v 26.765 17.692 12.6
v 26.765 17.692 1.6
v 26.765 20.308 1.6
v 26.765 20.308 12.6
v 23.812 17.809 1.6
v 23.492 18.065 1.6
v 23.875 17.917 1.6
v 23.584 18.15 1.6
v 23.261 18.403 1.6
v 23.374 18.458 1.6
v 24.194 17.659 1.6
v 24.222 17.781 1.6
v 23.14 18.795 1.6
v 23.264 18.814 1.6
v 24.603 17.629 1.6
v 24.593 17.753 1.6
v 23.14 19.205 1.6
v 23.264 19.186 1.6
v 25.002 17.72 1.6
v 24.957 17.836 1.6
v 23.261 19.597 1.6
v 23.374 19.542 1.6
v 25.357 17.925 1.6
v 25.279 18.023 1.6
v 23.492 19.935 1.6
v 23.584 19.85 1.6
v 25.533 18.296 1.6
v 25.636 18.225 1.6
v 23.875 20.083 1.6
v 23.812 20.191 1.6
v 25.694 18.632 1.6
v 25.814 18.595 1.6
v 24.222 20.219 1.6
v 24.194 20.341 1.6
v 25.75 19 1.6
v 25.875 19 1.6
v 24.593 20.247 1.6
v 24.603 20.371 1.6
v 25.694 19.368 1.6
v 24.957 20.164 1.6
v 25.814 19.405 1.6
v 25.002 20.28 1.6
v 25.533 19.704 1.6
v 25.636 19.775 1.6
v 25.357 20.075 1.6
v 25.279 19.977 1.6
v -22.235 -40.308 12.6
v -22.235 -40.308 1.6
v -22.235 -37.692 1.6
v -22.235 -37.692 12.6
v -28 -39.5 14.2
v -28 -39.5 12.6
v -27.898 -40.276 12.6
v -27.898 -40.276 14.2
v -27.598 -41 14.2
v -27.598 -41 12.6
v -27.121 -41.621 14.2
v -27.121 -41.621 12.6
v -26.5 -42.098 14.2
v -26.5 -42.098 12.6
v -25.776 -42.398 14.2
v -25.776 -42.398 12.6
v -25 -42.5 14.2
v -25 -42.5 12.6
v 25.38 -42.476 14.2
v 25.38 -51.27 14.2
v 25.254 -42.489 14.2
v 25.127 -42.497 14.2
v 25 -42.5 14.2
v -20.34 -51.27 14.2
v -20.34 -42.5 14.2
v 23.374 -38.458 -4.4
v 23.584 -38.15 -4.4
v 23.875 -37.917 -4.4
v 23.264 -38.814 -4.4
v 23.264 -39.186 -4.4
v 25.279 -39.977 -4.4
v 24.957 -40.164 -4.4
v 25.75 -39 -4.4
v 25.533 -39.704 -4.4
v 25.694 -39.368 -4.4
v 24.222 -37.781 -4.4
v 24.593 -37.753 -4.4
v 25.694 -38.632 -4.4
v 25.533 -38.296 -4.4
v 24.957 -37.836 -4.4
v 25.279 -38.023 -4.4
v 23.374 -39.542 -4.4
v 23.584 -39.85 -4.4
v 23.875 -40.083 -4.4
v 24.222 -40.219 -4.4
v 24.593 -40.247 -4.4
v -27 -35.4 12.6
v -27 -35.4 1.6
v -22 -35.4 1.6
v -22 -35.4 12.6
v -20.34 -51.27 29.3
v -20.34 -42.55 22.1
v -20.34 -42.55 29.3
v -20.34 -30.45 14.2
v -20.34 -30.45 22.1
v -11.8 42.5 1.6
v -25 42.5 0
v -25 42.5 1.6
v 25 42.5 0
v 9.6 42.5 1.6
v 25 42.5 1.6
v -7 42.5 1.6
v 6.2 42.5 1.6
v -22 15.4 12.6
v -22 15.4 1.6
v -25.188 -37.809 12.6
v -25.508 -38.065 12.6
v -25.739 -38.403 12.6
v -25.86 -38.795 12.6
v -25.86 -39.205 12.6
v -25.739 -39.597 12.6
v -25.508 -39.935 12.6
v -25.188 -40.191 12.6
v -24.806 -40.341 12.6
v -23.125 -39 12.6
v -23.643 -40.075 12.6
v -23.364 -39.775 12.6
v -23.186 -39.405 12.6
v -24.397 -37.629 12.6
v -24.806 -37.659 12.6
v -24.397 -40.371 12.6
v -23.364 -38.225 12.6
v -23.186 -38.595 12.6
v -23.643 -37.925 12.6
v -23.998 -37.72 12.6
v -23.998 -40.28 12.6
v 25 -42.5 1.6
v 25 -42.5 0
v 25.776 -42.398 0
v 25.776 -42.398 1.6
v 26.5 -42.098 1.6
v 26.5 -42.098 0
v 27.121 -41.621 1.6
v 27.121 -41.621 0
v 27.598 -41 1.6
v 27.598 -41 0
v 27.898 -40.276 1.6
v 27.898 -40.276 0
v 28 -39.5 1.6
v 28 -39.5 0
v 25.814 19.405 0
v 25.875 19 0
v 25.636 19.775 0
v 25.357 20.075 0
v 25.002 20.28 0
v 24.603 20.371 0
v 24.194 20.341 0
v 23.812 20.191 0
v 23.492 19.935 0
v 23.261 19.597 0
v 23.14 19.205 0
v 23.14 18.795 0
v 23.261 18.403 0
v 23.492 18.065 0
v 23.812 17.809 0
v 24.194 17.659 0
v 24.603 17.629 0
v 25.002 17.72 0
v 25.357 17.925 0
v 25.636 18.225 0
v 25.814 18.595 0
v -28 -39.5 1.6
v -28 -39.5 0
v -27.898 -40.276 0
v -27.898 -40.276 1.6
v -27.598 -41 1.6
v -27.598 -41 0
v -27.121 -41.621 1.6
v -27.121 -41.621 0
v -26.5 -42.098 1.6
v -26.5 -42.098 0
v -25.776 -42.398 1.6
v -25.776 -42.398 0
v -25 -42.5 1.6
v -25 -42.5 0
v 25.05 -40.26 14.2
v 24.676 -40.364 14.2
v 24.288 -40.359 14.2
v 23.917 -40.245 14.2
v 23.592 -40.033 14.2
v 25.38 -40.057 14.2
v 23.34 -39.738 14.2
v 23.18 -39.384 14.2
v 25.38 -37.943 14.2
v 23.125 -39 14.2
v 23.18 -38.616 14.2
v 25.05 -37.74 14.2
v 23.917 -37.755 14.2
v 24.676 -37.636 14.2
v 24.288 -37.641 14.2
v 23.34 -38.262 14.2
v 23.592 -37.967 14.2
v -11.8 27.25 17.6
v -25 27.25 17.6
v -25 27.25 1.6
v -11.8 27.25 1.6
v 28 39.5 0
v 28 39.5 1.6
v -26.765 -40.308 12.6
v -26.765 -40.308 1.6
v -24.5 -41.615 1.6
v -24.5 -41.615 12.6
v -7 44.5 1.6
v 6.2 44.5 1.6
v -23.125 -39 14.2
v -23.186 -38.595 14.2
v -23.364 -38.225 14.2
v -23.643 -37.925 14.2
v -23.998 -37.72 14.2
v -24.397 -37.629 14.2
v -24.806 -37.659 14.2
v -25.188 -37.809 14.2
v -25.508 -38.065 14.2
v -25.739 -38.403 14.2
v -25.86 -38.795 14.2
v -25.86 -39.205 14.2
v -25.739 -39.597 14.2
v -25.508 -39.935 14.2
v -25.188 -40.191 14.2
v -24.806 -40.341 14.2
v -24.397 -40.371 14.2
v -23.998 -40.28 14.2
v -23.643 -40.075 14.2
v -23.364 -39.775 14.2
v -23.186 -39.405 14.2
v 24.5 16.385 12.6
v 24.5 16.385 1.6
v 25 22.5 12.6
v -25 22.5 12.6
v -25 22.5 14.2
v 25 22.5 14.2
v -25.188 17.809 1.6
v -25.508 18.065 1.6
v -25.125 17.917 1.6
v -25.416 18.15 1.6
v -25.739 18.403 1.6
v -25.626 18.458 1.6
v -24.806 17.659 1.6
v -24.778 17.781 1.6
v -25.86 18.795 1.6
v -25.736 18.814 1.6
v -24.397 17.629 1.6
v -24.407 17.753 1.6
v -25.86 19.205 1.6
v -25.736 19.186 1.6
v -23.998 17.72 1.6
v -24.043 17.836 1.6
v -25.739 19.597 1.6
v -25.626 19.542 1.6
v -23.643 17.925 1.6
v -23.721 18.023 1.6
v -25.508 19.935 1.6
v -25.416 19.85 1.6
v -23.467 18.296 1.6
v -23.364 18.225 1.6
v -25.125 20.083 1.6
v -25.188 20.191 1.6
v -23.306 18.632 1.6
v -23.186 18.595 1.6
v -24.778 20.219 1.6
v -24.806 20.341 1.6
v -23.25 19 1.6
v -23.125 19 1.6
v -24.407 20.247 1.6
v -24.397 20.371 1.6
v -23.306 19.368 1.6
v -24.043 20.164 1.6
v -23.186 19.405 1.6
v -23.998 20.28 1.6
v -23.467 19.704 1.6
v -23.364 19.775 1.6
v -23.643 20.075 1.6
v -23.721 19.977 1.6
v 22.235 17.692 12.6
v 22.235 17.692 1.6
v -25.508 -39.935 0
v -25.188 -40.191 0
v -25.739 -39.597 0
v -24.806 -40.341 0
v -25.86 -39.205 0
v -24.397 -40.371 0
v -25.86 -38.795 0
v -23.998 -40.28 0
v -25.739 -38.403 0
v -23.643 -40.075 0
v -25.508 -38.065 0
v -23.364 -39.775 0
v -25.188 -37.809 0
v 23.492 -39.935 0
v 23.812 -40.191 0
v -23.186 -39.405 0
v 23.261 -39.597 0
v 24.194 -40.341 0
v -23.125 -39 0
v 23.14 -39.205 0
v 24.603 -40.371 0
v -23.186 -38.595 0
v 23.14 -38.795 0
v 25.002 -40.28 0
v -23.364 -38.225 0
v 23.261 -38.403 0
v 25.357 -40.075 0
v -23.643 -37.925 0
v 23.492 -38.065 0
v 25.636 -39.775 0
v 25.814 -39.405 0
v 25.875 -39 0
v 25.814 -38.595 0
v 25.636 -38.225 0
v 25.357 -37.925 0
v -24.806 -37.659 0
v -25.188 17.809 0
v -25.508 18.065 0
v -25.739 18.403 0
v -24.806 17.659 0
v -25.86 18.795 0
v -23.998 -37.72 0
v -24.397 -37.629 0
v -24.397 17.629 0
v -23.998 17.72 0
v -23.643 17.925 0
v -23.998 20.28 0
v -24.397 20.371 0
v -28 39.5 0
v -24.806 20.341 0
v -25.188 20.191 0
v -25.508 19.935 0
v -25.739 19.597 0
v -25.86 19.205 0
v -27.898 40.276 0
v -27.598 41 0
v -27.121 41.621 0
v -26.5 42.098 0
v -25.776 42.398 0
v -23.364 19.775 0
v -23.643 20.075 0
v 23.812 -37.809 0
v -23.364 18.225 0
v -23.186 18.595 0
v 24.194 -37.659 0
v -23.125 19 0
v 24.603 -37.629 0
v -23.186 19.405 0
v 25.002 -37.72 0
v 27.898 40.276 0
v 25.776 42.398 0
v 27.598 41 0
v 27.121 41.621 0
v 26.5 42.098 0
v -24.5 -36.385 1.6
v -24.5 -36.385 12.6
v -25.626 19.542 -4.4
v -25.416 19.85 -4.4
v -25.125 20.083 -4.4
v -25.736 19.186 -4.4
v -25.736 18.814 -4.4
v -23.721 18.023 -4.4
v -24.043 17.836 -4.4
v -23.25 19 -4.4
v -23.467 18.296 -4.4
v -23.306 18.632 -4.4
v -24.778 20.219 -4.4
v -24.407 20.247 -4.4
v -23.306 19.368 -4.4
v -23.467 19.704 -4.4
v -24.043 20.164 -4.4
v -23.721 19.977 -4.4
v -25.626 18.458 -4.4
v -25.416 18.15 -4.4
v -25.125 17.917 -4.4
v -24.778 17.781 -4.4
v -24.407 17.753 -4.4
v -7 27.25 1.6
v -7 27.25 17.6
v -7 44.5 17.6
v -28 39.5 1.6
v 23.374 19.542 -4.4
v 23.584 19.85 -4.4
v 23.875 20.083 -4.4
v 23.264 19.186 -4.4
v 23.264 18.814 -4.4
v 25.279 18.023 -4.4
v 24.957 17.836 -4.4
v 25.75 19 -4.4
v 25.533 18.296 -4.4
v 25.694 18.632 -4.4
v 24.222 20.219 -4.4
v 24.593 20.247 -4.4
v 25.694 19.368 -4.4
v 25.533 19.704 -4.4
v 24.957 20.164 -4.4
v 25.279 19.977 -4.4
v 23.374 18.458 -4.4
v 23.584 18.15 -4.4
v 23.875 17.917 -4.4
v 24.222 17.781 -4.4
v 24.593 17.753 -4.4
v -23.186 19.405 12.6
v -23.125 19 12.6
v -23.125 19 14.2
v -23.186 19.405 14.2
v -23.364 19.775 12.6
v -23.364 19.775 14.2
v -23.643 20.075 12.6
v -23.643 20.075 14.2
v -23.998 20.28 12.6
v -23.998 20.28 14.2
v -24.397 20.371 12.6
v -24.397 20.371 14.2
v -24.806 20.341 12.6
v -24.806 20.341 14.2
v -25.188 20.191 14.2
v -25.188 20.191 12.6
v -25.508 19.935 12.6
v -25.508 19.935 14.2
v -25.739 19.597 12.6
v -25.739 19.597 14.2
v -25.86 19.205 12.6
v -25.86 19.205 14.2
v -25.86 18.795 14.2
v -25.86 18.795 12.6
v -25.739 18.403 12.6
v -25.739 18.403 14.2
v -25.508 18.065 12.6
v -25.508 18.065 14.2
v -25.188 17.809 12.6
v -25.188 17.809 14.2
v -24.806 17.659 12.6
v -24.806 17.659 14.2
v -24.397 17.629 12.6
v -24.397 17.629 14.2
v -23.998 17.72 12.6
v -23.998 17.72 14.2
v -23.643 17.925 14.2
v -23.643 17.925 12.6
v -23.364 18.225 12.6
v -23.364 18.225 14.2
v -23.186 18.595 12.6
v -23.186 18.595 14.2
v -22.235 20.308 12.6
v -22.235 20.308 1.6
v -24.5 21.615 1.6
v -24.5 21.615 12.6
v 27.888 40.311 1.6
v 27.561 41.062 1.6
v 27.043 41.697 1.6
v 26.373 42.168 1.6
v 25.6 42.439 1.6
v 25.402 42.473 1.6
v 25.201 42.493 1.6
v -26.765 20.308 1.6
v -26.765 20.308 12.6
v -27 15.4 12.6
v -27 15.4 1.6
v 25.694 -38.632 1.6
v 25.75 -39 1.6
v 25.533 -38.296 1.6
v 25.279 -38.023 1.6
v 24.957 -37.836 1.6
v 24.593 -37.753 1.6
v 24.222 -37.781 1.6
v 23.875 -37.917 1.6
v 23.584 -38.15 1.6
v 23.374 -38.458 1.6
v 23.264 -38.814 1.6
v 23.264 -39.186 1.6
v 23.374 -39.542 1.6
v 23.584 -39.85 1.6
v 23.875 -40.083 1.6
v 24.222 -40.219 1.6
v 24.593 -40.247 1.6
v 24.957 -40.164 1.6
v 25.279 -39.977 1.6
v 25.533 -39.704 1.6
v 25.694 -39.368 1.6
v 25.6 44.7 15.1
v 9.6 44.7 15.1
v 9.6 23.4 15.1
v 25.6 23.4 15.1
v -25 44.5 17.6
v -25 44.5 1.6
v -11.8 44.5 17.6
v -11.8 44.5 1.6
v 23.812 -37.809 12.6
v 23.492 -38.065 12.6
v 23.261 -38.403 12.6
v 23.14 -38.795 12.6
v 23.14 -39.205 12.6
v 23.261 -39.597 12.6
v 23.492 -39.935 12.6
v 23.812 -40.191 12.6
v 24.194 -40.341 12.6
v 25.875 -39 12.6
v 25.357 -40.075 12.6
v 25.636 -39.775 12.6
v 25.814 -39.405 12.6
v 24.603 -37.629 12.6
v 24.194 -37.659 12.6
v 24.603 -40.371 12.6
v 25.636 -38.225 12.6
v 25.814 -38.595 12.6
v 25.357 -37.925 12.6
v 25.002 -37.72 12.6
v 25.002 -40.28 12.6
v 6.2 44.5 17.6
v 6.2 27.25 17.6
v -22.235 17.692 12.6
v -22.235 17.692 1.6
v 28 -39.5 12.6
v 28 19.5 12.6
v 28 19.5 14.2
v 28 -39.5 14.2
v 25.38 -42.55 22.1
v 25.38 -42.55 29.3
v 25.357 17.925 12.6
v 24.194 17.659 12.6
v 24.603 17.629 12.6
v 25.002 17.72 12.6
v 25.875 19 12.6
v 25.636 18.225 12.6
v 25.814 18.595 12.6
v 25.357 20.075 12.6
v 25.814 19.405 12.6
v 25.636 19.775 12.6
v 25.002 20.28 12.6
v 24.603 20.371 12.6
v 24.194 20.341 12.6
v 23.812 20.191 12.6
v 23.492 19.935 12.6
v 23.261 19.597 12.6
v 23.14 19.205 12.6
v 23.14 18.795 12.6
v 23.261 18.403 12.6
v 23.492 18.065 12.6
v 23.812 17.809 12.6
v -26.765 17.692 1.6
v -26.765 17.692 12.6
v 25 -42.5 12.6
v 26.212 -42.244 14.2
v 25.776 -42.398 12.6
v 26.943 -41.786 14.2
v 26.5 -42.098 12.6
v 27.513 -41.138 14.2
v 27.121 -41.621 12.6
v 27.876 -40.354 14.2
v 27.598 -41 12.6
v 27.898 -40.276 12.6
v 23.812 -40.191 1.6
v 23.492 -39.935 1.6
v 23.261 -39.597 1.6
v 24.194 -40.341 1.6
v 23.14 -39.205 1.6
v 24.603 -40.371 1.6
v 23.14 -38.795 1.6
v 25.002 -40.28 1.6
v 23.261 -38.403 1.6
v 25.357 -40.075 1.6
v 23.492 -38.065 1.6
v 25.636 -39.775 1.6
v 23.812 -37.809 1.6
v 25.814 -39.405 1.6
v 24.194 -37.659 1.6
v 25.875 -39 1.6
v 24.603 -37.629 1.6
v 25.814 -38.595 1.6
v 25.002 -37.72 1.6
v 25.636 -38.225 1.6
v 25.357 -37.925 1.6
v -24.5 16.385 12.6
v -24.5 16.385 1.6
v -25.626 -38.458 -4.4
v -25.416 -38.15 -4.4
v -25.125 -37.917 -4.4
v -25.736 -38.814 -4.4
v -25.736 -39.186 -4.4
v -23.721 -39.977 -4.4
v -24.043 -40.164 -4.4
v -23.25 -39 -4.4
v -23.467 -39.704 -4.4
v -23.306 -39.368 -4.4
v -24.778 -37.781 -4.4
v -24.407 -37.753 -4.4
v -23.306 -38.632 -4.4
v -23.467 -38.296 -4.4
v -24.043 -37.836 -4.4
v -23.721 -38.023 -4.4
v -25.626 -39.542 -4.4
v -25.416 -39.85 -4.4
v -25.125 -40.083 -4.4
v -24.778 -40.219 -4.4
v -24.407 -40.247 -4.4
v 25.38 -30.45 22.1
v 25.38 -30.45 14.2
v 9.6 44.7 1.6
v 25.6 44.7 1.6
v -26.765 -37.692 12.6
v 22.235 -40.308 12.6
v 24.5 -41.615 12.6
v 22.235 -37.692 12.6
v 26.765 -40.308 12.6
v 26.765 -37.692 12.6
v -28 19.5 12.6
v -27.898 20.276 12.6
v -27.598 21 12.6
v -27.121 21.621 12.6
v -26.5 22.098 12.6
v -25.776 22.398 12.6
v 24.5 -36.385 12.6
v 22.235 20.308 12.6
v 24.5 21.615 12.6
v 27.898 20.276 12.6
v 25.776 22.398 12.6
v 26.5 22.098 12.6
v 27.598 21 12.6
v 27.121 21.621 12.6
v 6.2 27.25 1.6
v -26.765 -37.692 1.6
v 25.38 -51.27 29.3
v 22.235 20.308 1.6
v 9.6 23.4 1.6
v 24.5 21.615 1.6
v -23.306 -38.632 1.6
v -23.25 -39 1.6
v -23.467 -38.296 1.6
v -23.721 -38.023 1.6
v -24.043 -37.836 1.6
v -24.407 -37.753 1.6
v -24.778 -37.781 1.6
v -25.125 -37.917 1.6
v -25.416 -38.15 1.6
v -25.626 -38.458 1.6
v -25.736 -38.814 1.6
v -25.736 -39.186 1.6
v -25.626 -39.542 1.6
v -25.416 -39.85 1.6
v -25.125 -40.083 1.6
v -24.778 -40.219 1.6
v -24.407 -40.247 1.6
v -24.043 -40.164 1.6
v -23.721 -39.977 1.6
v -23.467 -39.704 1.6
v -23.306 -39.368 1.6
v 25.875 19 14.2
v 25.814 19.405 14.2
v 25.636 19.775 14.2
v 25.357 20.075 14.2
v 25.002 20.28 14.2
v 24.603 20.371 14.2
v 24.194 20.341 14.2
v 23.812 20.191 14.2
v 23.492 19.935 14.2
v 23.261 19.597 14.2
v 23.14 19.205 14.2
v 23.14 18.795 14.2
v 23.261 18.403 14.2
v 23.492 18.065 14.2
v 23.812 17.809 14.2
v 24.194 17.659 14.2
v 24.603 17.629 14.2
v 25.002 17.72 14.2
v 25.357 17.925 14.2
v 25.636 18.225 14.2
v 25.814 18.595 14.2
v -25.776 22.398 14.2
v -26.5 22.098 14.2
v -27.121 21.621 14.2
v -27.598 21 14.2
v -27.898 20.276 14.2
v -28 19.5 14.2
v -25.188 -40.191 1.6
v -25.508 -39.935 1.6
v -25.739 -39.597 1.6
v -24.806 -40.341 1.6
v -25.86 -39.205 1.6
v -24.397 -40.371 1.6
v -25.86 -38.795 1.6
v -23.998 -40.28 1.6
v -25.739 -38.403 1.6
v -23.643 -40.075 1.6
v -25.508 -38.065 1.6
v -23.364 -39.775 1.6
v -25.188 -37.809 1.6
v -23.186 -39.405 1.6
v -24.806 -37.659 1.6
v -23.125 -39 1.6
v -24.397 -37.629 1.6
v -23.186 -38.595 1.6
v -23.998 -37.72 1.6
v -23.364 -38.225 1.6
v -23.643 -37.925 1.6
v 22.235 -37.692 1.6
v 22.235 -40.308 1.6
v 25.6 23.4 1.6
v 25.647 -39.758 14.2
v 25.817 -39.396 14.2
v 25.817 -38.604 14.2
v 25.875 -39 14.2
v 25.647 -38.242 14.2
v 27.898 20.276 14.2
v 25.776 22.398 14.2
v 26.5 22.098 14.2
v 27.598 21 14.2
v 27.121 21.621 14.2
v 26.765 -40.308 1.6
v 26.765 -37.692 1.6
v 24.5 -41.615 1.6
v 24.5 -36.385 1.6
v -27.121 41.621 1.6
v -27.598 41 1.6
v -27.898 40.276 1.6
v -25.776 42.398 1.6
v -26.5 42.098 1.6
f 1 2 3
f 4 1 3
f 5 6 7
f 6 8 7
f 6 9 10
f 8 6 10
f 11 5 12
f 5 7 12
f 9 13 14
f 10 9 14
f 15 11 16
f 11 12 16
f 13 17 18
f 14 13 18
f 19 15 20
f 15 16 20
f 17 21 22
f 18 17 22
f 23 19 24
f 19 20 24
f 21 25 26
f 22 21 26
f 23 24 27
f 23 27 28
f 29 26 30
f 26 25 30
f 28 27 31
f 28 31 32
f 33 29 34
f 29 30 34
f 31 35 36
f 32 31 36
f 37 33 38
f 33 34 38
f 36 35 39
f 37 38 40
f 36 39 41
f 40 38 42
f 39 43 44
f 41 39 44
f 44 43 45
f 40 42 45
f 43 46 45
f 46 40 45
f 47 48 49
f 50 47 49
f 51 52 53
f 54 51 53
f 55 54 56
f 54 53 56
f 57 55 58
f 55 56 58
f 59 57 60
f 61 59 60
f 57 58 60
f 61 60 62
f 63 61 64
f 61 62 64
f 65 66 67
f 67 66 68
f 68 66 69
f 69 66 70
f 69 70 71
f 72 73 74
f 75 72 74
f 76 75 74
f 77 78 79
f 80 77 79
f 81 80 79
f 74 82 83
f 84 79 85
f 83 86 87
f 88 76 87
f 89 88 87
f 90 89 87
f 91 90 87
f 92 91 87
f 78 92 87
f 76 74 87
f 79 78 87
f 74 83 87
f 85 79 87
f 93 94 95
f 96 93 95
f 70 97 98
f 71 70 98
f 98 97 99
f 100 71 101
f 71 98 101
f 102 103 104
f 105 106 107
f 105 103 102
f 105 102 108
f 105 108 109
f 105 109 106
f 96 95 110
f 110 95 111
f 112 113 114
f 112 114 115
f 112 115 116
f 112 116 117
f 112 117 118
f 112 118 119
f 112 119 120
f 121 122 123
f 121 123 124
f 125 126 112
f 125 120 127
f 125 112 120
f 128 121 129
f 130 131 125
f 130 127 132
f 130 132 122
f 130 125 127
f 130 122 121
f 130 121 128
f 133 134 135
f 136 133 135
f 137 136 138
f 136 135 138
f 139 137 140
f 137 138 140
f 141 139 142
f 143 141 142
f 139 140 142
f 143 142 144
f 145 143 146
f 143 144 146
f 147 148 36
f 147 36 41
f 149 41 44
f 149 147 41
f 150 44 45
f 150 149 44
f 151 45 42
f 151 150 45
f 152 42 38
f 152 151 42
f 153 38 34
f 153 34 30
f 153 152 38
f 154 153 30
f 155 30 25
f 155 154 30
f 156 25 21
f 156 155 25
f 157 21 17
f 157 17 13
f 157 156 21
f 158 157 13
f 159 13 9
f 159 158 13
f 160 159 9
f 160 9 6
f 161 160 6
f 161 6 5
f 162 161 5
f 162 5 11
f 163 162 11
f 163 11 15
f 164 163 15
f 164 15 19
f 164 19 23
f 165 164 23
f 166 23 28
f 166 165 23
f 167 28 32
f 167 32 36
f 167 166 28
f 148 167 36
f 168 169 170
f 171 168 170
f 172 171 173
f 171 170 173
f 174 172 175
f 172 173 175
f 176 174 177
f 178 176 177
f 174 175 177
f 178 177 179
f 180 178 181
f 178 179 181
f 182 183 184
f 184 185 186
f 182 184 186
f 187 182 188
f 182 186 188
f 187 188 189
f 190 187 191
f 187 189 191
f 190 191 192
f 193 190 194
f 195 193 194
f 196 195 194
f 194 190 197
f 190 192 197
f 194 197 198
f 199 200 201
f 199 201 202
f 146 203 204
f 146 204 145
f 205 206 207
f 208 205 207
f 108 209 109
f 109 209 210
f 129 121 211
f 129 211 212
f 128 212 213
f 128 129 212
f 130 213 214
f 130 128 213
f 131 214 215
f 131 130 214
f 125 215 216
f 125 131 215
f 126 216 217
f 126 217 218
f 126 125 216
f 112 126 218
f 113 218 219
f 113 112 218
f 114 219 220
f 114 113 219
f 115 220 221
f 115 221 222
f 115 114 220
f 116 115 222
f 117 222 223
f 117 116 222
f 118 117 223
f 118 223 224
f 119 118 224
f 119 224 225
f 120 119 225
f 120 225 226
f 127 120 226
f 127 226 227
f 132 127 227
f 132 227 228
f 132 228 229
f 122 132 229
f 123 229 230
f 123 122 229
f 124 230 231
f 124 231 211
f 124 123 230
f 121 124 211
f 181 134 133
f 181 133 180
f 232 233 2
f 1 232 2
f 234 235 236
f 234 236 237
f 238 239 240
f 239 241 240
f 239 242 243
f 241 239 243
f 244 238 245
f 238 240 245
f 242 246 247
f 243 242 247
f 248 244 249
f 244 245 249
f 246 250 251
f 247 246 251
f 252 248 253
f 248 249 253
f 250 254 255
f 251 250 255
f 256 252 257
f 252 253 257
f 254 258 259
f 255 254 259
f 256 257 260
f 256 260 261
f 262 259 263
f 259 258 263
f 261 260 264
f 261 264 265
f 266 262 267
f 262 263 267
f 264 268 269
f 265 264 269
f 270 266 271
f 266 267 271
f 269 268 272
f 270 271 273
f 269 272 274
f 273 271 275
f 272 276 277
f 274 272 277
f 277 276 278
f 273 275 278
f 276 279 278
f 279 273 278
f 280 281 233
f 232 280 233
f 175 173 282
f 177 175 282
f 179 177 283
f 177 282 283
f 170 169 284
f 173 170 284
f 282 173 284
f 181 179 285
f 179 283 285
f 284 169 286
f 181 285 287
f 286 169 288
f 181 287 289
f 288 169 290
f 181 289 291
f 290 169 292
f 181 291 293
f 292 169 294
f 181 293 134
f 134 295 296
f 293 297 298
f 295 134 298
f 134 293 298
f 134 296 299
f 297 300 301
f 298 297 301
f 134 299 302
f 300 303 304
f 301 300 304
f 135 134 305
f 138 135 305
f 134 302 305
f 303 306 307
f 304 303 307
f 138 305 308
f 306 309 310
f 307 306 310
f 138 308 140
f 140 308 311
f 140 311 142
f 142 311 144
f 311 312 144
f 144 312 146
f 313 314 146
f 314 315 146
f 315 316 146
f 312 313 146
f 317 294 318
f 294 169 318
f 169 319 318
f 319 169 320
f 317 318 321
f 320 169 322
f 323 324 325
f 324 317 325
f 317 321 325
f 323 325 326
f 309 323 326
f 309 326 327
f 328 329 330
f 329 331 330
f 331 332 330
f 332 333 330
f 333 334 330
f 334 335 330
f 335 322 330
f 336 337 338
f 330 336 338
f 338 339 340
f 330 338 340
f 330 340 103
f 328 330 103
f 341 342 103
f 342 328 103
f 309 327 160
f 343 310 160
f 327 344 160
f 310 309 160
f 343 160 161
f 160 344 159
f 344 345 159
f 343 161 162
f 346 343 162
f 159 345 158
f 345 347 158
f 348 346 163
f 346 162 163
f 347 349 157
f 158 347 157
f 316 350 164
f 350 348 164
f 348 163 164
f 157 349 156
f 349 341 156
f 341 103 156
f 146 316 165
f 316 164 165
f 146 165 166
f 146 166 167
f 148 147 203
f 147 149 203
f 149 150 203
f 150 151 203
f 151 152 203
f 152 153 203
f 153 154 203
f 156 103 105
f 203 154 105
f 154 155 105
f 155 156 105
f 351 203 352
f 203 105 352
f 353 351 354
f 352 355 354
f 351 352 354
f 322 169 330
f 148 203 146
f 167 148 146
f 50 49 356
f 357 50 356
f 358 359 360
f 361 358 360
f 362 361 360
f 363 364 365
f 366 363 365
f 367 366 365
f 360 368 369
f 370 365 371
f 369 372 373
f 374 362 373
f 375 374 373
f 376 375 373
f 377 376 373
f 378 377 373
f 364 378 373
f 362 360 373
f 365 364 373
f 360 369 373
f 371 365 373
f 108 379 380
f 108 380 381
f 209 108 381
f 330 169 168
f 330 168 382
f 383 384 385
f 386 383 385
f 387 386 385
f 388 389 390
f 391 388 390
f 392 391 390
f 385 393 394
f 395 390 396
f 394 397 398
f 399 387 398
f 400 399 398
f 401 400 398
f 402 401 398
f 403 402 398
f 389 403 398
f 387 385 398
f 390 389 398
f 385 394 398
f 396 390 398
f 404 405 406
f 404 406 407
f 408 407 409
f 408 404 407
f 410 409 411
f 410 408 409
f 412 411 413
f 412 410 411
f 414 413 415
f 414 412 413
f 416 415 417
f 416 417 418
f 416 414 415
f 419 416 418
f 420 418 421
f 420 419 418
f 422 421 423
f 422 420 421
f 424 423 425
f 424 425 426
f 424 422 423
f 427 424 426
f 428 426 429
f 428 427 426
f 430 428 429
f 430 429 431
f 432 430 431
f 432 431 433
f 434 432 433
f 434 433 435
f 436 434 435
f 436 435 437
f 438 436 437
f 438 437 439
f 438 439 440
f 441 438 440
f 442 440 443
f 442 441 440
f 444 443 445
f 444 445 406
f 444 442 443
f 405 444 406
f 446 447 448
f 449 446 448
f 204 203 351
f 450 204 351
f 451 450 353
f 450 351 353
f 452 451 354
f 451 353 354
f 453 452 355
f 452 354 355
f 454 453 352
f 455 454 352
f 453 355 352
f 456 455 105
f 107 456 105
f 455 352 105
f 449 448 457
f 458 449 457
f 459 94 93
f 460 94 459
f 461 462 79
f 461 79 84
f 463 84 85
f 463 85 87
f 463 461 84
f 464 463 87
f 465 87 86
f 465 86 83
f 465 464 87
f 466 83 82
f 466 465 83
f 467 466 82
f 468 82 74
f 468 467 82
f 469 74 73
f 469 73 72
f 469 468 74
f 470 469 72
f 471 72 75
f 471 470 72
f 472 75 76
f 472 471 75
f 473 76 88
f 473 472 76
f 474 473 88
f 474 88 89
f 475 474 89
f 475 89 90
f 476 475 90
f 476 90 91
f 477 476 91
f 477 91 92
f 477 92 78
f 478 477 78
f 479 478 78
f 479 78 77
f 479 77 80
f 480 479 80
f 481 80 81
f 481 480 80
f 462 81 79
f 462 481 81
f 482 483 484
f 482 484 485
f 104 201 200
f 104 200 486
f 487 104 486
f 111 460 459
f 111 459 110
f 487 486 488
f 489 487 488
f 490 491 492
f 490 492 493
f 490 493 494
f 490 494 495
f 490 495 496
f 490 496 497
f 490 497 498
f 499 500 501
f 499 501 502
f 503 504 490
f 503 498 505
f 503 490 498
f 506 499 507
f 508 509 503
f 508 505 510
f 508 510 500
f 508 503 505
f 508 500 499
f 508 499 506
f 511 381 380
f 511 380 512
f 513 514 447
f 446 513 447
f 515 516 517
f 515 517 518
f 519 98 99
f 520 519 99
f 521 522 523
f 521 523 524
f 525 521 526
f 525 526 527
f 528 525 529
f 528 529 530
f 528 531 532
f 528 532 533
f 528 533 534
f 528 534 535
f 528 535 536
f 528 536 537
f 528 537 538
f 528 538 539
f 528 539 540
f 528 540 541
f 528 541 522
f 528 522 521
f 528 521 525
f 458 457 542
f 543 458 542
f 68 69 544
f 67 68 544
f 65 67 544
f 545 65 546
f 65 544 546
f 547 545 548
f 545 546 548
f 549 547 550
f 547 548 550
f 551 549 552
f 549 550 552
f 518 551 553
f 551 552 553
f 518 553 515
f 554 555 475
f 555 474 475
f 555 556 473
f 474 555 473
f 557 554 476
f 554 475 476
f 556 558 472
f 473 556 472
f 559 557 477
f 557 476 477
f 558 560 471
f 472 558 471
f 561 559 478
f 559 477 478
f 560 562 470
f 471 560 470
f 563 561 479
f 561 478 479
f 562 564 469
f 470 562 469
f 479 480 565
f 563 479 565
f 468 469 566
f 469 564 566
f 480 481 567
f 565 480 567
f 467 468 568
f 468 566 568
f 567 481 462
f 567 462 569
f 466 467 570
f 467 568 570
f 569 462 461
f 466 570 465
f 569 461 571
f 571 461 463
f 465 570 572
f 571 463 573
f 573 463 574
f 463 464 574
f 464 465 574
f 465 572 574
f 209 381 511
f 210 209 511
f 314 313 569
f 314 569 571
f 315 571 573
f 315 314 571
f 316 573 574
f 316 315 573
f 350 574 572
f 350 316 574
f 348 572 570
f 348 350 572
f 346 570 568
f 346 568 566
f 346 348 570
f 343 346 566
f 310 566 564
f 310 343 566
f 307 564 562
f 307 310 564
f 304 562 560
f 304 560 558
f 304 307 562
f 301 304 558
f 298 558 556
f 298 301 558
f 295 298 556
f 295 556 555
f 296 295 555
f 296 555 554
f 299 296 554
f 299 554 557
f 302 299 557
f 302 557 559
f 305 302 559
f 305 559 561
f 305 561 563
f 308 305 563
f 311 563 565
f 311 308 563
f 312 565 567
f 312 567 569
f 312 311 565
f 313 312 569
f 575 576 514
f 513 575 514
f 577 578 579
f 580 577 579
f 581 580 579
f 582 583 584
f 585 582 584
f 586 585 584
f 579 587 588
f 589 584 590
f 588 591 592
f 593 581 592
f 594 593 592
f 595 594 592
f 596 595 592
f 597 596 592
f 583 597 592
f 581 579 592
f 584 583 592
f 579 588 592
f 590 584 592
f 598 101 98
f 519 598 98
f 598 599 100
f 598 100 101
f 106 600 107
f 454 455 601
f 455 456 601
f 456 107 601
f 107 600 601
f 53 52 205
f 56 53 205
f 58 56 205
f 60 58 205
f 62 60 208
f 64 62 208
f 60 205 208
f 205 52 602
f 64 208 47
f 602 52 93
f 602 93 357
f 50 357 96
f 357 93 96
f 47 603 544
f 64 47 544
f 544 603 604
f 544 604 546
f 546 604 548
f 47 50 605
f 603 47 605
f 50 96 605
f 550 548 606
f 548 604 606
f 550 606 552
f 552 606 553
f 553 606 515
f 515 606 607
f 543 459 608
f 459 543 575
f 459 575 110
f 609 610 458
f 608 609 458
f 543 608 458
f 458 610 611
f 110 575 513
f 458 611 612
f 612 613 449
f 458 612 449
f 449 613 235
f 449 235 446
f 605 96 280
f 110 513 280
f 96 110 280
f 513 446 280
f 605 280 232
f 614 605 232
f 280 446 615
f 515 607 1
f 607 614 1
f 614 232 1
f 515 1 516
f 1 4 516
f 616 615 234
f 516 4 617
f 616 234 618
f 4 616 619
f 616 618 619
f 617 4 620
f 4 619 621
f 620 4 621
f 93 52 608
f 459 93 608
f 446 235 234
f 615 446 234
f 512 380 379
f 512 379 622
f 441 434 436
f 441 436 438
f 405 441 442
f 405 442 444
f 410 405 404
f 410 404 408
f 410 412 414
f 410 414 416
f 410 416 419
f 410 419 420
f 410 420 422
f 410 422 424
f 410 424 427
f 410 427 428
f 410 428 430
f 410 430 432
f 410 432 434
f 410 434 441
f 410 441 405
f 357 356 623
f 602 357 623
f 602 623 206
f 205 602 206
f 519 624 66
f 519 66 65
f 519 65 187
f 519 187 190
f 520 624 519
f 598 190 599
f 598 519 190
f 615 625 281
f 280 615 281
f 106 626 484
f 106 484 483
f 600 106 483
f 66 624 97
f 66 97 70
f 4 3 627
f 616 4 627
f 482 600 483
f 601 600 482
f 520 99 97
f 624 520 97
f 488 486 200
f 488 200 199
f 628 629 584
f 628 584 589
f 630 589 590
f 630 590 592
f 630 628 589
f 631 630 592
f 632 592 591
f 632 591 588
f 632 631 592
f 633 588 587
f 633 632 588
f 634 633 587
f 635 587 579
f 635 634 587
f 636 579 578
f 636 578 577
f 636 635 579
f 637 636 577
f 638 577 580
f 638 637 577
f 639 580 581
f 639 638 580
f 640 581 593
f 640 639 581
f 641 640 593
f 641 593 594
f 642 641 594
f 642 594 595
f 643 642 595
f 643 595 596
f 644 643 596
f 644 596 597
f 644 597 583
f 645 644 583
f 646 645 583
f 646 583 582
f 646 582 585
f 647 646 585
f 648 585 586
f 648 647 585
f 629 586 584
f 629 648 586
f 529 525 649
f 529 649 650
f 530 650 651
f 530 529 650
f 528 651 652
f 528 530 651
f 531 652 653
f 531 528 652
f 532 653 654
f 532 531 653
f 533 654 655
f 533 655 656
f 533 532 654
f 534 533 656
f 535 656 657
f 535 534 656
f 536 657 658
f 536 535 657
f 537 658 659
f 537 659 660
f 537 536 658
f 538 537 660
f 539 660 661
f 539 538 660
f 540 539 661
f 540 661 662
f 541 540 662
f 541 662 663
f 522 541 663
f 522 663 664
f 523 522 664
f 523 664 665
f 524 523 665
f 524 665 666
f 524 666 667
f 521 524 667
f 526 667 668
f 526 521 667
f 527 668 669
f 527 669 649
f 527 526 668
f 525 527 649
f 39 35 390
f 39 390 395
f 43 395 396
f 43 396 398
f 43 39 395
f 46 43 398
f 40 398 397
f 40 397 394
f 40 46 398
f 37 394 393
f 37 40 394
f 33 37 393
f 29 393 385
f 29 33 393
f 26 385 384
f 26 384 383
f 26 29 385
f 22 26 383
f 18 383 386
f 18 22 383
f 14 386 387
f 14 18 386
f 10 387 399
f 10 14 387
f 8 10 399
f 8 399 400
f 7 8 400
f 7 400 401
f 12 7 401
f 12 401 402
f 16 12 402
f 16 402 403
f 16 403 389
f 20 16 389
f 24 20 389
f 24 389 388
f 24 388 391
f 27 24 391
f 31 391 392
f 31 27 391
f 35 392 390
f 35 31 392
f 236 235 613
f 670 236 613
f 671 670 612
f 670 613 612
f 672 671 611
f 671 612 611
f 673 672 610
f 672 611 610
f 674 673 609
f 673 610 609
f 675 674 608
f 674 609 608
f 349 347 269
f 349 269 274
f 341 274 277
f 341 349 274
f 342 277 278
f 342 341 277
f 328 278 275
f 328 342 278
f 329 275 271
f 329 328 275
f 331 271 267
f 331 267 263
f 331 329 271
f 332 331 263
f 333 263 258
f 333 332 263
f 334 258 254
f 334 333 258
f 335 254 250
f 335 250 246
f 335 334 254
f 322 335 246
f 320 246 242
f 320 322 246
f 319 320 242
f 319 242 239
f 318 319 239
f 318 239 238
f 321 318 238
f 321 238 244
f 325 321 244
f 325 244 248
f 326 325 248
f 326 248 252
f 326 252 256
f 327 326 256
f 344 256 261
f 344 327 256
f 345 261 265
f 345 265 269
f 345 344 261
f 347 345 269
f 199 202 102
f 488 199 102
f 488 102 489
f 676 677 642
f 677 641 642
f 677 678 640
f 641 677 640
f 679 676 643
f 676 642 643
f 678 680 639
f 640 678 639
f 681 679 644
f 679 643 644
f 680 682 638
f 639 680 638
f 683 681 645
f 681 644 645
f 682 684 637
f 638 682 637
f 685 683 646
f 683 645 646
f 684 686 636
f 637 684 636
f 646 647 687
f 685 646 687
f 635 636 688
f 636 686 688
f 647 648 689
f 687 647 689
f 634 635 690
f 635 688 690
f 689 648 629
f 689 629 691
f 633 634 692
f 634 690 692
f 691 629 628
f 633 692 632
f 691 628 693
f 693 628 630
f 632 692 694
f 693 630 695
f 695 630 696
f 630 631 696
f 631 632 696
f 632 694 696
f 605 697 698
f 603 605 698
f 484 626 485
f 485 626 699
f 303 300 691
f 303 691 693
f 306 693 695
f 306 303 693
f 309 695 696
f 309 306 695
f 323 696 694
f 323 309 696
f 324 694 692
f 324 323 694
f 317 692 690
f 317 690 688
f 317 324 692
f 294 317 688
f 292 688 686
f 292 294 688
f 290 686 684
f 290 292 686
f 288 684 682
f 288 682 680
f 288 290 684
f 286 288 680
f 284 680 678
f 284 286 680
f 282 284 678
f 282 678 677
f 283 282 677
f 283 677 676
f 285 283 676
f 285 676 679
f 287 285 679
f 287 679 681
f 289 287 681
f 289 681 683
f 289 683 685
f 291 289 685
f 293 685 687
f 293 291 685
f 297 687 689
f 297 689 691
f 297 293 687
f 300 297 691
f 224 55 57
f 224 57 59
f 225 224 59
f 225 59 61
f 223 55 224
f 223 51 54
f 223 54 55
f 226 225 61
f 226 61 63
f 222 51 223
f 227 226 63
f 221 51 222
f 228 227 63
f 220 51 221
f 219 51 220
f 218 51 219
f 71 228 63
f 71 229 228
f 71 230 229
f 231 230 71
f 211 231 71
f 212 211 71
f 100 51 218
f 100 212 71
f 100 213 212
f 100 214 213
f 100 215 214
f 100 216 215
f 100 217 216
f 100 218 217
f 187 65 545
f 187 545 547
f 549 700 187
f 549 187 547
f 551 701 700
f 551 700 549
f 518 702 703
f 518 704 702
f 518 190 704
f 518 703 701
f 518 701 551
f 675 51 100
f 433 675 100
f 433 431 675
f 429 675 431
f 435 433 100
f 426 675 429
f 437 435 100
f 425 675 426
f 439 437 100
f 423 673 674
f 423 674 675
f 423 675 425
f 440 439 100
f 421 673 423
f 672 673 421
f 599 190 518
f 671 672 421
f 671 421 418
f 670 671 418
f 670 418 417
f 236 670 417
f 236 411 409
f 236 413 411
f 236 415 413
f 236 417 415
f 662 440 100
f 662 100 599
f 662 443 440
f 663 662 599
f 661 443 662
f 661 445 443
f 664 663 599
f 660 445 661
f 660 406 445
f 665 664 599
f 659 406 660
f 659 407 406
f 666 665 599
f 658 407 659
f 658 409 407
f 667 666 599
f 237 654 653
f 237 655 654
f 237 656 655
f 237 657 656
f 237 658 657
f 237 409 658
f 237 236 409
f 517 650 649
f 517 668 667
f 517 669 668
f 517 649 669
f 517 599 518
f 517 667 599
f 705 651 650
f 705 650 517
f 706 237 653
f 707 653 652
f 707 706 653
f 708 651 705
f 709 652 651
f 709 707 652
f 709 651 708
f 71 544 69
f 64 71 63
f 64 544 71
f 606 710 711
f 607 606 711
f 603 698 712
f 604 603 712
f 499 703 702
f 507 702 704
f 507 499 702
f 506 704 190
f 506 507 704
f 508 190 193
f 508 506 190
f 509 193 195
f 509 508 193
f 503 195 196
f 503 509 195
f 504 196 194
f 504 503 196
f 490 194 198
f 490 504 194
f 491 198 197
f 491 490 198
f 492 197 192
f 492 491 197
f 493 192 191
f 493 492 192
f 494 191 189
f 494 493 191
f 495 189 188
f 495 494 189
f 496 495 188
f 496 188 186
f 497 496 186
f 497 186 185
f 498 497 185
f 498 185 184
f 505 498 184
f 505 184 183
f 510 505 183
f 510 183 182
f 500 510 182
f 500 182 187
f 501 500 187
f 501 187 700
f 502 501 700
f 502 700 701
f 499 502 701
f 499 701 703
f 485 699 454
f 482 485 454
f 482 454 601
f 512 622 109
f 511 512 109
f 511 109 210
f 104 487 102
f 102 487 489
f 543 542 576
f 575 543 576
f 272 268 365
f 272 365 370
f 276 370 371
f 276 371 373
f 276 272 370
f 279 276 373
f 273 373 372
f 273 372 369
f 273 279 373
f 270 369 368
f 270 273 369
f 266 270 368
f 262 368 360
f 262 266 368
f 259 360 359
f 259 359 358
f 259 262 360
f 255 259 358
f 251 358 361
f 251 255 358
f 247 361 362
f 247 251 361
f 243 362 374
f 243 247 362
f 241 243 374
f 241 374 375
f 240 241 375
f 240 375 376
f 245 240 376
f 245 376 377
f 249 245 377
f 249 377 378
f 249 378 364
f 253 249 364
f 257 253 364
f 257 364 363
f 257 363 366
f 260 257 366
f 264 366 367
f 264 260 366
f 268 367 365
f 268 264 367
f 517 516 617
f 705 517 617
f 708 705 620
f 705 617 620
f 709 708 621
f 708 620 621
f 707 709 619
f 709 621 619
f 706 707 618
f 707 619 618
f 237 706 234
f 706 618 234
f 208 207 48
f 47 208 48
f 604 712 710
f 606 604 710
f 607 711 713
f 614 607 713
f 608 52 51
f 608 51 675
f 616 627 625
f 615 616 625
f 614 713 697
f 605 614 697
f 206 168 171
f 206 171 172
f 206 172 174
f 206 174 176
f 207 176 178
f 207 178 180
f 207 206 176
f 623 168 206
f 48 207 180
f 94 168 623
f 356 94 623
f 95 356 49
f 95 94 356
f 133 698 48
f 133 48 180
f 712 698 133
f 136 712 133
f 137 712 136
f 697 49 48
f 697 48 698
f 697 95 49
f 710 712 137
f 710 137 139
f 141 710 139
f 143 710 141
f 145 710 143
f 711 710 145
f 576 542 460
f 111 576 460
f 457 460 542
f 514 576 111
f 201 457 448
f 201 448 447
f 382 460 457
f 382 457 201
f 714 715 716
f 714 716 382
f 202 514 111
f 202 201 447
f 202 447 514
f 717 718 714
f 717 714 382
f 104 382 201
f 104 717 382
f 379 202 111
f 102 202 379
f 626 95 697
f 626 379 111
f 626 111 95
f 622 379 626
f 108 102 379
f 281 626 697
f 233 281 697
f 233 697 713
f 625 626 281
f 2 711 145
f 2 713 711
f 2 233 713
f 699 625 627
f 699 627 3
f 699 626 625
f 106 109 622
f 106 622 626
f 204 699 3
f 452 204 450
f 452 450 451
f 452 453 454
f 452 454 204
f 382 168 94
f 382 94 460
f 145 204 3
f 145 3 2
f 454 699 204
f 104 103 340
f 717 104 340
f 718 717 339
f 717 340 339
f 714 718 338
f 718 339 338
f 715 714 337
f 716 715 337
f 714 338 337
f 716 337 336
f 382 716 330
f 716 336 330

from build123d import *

# Parameters (mm, degrees)
SKETCH_R     = 1.375
PAD_DEPTH    = 1.6
SKETCH001_W  = 16
SKETCH001_H  = 21.3
PAD001_DEPTH = 13.5
SKETCH002_W  = 13.2
SKETCH002_H  = 17.25
PAD002_DEPTH = 16
PAD008_DEPTH = 11
SKETCH011_R  = 1.25
PAD009_DEPTH = 6
SKETCH012_W  = 5
SKETCH012_H  = 50.8
PAD010_DEPTH = 11
SKETCH013_R  = 1.375
PAD011_DEPTH = 1.6
PAD012_DEPTH = 45.72


with BuildPart() as part:
    # Sketch → Pad (new body)
    with BuildSketch(Plane.XY):
        with BuildLine():
            ThreePointArc((-25, 42.5), (-27.12132, 41.62132), (-28, 39.5))
            Line((-28, -39.5), (-28, 39.5))
            ThreePointArc((-28, -39.5), (-27.12132, -41.62132), (-25, -42.5))
            Line((25, -42.5), (-25, -42.5))
            ThreePointArc((25, -42.5), (27.12132, -41.62132), (28, -39.5))
            Line((28, 39.5), (28, -39.5))
            ThreePointArc((28, 39.5), (27.12132, 41.62132), (25, 42.5))
            Line((-25, 42.5), (25, 42.5))
        make_face()
        with Locations((-24.5, 19)):
            Circle(SKETCH_R, mode=Mode.SUBTRACT)
        with Locations((24.5, 19)):
            Circle(SKETCH_R, mode=Mode.SUBTRACT)
        with Locations((-24.5, -39)):
            Circle(SKETCH_R, mode=Mode.SUBTRACT)
        with Locations((24.5, -39)):
            Circle(SKETCH_R, mode=Mode.SUBTRACT)
    extrude(amount=PAD_DEPTH)

    # Sketch001 → Pad001 (join)
    with BuildSketch(Plane.XY.offset(1.6)):
        with Locations((17.6, 34.05)):
            Rectangle(SKETCH001_W, SKETCH001_H)
    extrude(amount=PAD001_DEPTH)

    # Sketch002 → Pad002 (join)
    with BuildSketch(Plane.XY.offset(1.6)):
        with Locations((-18.4, 35.875)):
            Rectangle(SKETCH002_W, SKETCH002_H)
        with Locations((-0.4, 35.875)):
            Rectangle(SKETCH002_W, SKETCH002_H)
    extrude(amount=PAD002_DEPTH)

    # Sketch010 → Pad008 (join)
    with BuildSketch(Plane.XY.offset(1.6)):
        Polygon((-22.235344, -40.3075), (-22.235344, -37.6925), (-24.5, -36.385), (-26.764656, -37.6925), (-26.764656, -40.3075), (-24.5, -41.615), align=None)
        Polygon((-22.235344, 17.6925), (-22.235344, 20.3075), (-24.5, 21.615), (-26.764656, 20.3075), (-26.764656, 17.6925), (-24.5, 16.385), align=None)
        Polygon((24.5, -41.615), (26.764656, -40.3075), (26.764656, -37.6925), (24.5, -36.385), (22.235344, -37.6925), (22.235344, -40.3075), align=None)
        Polygon((24.5, 16.385), (26.764656, 17.6925), (26.764656, 20.3075), (24.5, 21.615), (22.235344, 20.3075), (22.235344, 17.6925), align=None)
    extrude(amount=PAD008_DEPTH)

    # Sketch011 → Pad009 (join)
    with BuildSketch(Plane.XY.offset(1.6)):
        with Locations((-24.5, 19)):
            Circle(SKETCH011_R)
        with Locations((-24.5, -39)):
            Circle(SKETCH011_R)
        with Locations((24.5, 19)):
            Circle(SKETCH011_R)
        with Locations((24.5, -39)):
            Circle(SKETCH011_R)
    extrude(amount=-PAD009_DEPTH)

    # Sketch012 → Pad010 (join)
    with BuildSketch(Plane.XY.offset(1.6)):
        with Locations((-24.5, -10)):
            Rectangle(SKETCH012_W, SKETCH012_H)
    extrude(amount=PAD010_DEPTH)

    # Sketch013 → Pad011 (join)
    with BuildSketch(Plane.XY.offset(12.6)):
        with BuildLine():
            ThreePointArc((-25, 22.5), (-27.12132, 21.62132), (-28, 19.5))
            Line((-28, -39.5), (-28, 19.5))
            ThreePointArc((-28, -39.5), (-27.12132, -41.62132), (-25, -42.5))
            Line((25, -42.5), (-25, -42.5))
            ThreePointArc((25, -42.5), (27.12132, -41.62132), (28, -39.5))
            Line((28, 19.5), (28, -39.5))
            ThreePointArc((28, 19.5), (27.12132, 21.62132), (25, 22.5))
            Line((-25, 22.5), (25, 22.5))
        make_face()
        with Locations((-24.5, 19)):
            Circle(SKETCH013_R, mode=Mode.SUBTRACT)
        with Locations((24.5, 19)):
            Circle(SKETCH013_R, mode=Mode.SUBTRACT)
        with Locations((-24.5, -39)):
            Circle(SKETCH013_R, mode=Mode.SUBTRACT)
        with Locations((24.5, -39)):
            Circle(SKETCH013_R, mode=Mode.SUBTRACT)
    extrude(amount=PAD011_DEPTH)

    # Sketch014 → Pad012 (join)
    with BuildSketch(Plane(origin=(-20.34, -30.45, 14.2), x_dir=(0, 1, 0), z_dir=(1, 0, 0))):
        Polygon((0, 0), (0, 7.9), (-12.1, 7.9), (-12.1, 15.1), (-20.82, 15.1), (-20.82, 0), align=None)
    extrude(amount=PAD012_DEPTH)


solid = part.part
